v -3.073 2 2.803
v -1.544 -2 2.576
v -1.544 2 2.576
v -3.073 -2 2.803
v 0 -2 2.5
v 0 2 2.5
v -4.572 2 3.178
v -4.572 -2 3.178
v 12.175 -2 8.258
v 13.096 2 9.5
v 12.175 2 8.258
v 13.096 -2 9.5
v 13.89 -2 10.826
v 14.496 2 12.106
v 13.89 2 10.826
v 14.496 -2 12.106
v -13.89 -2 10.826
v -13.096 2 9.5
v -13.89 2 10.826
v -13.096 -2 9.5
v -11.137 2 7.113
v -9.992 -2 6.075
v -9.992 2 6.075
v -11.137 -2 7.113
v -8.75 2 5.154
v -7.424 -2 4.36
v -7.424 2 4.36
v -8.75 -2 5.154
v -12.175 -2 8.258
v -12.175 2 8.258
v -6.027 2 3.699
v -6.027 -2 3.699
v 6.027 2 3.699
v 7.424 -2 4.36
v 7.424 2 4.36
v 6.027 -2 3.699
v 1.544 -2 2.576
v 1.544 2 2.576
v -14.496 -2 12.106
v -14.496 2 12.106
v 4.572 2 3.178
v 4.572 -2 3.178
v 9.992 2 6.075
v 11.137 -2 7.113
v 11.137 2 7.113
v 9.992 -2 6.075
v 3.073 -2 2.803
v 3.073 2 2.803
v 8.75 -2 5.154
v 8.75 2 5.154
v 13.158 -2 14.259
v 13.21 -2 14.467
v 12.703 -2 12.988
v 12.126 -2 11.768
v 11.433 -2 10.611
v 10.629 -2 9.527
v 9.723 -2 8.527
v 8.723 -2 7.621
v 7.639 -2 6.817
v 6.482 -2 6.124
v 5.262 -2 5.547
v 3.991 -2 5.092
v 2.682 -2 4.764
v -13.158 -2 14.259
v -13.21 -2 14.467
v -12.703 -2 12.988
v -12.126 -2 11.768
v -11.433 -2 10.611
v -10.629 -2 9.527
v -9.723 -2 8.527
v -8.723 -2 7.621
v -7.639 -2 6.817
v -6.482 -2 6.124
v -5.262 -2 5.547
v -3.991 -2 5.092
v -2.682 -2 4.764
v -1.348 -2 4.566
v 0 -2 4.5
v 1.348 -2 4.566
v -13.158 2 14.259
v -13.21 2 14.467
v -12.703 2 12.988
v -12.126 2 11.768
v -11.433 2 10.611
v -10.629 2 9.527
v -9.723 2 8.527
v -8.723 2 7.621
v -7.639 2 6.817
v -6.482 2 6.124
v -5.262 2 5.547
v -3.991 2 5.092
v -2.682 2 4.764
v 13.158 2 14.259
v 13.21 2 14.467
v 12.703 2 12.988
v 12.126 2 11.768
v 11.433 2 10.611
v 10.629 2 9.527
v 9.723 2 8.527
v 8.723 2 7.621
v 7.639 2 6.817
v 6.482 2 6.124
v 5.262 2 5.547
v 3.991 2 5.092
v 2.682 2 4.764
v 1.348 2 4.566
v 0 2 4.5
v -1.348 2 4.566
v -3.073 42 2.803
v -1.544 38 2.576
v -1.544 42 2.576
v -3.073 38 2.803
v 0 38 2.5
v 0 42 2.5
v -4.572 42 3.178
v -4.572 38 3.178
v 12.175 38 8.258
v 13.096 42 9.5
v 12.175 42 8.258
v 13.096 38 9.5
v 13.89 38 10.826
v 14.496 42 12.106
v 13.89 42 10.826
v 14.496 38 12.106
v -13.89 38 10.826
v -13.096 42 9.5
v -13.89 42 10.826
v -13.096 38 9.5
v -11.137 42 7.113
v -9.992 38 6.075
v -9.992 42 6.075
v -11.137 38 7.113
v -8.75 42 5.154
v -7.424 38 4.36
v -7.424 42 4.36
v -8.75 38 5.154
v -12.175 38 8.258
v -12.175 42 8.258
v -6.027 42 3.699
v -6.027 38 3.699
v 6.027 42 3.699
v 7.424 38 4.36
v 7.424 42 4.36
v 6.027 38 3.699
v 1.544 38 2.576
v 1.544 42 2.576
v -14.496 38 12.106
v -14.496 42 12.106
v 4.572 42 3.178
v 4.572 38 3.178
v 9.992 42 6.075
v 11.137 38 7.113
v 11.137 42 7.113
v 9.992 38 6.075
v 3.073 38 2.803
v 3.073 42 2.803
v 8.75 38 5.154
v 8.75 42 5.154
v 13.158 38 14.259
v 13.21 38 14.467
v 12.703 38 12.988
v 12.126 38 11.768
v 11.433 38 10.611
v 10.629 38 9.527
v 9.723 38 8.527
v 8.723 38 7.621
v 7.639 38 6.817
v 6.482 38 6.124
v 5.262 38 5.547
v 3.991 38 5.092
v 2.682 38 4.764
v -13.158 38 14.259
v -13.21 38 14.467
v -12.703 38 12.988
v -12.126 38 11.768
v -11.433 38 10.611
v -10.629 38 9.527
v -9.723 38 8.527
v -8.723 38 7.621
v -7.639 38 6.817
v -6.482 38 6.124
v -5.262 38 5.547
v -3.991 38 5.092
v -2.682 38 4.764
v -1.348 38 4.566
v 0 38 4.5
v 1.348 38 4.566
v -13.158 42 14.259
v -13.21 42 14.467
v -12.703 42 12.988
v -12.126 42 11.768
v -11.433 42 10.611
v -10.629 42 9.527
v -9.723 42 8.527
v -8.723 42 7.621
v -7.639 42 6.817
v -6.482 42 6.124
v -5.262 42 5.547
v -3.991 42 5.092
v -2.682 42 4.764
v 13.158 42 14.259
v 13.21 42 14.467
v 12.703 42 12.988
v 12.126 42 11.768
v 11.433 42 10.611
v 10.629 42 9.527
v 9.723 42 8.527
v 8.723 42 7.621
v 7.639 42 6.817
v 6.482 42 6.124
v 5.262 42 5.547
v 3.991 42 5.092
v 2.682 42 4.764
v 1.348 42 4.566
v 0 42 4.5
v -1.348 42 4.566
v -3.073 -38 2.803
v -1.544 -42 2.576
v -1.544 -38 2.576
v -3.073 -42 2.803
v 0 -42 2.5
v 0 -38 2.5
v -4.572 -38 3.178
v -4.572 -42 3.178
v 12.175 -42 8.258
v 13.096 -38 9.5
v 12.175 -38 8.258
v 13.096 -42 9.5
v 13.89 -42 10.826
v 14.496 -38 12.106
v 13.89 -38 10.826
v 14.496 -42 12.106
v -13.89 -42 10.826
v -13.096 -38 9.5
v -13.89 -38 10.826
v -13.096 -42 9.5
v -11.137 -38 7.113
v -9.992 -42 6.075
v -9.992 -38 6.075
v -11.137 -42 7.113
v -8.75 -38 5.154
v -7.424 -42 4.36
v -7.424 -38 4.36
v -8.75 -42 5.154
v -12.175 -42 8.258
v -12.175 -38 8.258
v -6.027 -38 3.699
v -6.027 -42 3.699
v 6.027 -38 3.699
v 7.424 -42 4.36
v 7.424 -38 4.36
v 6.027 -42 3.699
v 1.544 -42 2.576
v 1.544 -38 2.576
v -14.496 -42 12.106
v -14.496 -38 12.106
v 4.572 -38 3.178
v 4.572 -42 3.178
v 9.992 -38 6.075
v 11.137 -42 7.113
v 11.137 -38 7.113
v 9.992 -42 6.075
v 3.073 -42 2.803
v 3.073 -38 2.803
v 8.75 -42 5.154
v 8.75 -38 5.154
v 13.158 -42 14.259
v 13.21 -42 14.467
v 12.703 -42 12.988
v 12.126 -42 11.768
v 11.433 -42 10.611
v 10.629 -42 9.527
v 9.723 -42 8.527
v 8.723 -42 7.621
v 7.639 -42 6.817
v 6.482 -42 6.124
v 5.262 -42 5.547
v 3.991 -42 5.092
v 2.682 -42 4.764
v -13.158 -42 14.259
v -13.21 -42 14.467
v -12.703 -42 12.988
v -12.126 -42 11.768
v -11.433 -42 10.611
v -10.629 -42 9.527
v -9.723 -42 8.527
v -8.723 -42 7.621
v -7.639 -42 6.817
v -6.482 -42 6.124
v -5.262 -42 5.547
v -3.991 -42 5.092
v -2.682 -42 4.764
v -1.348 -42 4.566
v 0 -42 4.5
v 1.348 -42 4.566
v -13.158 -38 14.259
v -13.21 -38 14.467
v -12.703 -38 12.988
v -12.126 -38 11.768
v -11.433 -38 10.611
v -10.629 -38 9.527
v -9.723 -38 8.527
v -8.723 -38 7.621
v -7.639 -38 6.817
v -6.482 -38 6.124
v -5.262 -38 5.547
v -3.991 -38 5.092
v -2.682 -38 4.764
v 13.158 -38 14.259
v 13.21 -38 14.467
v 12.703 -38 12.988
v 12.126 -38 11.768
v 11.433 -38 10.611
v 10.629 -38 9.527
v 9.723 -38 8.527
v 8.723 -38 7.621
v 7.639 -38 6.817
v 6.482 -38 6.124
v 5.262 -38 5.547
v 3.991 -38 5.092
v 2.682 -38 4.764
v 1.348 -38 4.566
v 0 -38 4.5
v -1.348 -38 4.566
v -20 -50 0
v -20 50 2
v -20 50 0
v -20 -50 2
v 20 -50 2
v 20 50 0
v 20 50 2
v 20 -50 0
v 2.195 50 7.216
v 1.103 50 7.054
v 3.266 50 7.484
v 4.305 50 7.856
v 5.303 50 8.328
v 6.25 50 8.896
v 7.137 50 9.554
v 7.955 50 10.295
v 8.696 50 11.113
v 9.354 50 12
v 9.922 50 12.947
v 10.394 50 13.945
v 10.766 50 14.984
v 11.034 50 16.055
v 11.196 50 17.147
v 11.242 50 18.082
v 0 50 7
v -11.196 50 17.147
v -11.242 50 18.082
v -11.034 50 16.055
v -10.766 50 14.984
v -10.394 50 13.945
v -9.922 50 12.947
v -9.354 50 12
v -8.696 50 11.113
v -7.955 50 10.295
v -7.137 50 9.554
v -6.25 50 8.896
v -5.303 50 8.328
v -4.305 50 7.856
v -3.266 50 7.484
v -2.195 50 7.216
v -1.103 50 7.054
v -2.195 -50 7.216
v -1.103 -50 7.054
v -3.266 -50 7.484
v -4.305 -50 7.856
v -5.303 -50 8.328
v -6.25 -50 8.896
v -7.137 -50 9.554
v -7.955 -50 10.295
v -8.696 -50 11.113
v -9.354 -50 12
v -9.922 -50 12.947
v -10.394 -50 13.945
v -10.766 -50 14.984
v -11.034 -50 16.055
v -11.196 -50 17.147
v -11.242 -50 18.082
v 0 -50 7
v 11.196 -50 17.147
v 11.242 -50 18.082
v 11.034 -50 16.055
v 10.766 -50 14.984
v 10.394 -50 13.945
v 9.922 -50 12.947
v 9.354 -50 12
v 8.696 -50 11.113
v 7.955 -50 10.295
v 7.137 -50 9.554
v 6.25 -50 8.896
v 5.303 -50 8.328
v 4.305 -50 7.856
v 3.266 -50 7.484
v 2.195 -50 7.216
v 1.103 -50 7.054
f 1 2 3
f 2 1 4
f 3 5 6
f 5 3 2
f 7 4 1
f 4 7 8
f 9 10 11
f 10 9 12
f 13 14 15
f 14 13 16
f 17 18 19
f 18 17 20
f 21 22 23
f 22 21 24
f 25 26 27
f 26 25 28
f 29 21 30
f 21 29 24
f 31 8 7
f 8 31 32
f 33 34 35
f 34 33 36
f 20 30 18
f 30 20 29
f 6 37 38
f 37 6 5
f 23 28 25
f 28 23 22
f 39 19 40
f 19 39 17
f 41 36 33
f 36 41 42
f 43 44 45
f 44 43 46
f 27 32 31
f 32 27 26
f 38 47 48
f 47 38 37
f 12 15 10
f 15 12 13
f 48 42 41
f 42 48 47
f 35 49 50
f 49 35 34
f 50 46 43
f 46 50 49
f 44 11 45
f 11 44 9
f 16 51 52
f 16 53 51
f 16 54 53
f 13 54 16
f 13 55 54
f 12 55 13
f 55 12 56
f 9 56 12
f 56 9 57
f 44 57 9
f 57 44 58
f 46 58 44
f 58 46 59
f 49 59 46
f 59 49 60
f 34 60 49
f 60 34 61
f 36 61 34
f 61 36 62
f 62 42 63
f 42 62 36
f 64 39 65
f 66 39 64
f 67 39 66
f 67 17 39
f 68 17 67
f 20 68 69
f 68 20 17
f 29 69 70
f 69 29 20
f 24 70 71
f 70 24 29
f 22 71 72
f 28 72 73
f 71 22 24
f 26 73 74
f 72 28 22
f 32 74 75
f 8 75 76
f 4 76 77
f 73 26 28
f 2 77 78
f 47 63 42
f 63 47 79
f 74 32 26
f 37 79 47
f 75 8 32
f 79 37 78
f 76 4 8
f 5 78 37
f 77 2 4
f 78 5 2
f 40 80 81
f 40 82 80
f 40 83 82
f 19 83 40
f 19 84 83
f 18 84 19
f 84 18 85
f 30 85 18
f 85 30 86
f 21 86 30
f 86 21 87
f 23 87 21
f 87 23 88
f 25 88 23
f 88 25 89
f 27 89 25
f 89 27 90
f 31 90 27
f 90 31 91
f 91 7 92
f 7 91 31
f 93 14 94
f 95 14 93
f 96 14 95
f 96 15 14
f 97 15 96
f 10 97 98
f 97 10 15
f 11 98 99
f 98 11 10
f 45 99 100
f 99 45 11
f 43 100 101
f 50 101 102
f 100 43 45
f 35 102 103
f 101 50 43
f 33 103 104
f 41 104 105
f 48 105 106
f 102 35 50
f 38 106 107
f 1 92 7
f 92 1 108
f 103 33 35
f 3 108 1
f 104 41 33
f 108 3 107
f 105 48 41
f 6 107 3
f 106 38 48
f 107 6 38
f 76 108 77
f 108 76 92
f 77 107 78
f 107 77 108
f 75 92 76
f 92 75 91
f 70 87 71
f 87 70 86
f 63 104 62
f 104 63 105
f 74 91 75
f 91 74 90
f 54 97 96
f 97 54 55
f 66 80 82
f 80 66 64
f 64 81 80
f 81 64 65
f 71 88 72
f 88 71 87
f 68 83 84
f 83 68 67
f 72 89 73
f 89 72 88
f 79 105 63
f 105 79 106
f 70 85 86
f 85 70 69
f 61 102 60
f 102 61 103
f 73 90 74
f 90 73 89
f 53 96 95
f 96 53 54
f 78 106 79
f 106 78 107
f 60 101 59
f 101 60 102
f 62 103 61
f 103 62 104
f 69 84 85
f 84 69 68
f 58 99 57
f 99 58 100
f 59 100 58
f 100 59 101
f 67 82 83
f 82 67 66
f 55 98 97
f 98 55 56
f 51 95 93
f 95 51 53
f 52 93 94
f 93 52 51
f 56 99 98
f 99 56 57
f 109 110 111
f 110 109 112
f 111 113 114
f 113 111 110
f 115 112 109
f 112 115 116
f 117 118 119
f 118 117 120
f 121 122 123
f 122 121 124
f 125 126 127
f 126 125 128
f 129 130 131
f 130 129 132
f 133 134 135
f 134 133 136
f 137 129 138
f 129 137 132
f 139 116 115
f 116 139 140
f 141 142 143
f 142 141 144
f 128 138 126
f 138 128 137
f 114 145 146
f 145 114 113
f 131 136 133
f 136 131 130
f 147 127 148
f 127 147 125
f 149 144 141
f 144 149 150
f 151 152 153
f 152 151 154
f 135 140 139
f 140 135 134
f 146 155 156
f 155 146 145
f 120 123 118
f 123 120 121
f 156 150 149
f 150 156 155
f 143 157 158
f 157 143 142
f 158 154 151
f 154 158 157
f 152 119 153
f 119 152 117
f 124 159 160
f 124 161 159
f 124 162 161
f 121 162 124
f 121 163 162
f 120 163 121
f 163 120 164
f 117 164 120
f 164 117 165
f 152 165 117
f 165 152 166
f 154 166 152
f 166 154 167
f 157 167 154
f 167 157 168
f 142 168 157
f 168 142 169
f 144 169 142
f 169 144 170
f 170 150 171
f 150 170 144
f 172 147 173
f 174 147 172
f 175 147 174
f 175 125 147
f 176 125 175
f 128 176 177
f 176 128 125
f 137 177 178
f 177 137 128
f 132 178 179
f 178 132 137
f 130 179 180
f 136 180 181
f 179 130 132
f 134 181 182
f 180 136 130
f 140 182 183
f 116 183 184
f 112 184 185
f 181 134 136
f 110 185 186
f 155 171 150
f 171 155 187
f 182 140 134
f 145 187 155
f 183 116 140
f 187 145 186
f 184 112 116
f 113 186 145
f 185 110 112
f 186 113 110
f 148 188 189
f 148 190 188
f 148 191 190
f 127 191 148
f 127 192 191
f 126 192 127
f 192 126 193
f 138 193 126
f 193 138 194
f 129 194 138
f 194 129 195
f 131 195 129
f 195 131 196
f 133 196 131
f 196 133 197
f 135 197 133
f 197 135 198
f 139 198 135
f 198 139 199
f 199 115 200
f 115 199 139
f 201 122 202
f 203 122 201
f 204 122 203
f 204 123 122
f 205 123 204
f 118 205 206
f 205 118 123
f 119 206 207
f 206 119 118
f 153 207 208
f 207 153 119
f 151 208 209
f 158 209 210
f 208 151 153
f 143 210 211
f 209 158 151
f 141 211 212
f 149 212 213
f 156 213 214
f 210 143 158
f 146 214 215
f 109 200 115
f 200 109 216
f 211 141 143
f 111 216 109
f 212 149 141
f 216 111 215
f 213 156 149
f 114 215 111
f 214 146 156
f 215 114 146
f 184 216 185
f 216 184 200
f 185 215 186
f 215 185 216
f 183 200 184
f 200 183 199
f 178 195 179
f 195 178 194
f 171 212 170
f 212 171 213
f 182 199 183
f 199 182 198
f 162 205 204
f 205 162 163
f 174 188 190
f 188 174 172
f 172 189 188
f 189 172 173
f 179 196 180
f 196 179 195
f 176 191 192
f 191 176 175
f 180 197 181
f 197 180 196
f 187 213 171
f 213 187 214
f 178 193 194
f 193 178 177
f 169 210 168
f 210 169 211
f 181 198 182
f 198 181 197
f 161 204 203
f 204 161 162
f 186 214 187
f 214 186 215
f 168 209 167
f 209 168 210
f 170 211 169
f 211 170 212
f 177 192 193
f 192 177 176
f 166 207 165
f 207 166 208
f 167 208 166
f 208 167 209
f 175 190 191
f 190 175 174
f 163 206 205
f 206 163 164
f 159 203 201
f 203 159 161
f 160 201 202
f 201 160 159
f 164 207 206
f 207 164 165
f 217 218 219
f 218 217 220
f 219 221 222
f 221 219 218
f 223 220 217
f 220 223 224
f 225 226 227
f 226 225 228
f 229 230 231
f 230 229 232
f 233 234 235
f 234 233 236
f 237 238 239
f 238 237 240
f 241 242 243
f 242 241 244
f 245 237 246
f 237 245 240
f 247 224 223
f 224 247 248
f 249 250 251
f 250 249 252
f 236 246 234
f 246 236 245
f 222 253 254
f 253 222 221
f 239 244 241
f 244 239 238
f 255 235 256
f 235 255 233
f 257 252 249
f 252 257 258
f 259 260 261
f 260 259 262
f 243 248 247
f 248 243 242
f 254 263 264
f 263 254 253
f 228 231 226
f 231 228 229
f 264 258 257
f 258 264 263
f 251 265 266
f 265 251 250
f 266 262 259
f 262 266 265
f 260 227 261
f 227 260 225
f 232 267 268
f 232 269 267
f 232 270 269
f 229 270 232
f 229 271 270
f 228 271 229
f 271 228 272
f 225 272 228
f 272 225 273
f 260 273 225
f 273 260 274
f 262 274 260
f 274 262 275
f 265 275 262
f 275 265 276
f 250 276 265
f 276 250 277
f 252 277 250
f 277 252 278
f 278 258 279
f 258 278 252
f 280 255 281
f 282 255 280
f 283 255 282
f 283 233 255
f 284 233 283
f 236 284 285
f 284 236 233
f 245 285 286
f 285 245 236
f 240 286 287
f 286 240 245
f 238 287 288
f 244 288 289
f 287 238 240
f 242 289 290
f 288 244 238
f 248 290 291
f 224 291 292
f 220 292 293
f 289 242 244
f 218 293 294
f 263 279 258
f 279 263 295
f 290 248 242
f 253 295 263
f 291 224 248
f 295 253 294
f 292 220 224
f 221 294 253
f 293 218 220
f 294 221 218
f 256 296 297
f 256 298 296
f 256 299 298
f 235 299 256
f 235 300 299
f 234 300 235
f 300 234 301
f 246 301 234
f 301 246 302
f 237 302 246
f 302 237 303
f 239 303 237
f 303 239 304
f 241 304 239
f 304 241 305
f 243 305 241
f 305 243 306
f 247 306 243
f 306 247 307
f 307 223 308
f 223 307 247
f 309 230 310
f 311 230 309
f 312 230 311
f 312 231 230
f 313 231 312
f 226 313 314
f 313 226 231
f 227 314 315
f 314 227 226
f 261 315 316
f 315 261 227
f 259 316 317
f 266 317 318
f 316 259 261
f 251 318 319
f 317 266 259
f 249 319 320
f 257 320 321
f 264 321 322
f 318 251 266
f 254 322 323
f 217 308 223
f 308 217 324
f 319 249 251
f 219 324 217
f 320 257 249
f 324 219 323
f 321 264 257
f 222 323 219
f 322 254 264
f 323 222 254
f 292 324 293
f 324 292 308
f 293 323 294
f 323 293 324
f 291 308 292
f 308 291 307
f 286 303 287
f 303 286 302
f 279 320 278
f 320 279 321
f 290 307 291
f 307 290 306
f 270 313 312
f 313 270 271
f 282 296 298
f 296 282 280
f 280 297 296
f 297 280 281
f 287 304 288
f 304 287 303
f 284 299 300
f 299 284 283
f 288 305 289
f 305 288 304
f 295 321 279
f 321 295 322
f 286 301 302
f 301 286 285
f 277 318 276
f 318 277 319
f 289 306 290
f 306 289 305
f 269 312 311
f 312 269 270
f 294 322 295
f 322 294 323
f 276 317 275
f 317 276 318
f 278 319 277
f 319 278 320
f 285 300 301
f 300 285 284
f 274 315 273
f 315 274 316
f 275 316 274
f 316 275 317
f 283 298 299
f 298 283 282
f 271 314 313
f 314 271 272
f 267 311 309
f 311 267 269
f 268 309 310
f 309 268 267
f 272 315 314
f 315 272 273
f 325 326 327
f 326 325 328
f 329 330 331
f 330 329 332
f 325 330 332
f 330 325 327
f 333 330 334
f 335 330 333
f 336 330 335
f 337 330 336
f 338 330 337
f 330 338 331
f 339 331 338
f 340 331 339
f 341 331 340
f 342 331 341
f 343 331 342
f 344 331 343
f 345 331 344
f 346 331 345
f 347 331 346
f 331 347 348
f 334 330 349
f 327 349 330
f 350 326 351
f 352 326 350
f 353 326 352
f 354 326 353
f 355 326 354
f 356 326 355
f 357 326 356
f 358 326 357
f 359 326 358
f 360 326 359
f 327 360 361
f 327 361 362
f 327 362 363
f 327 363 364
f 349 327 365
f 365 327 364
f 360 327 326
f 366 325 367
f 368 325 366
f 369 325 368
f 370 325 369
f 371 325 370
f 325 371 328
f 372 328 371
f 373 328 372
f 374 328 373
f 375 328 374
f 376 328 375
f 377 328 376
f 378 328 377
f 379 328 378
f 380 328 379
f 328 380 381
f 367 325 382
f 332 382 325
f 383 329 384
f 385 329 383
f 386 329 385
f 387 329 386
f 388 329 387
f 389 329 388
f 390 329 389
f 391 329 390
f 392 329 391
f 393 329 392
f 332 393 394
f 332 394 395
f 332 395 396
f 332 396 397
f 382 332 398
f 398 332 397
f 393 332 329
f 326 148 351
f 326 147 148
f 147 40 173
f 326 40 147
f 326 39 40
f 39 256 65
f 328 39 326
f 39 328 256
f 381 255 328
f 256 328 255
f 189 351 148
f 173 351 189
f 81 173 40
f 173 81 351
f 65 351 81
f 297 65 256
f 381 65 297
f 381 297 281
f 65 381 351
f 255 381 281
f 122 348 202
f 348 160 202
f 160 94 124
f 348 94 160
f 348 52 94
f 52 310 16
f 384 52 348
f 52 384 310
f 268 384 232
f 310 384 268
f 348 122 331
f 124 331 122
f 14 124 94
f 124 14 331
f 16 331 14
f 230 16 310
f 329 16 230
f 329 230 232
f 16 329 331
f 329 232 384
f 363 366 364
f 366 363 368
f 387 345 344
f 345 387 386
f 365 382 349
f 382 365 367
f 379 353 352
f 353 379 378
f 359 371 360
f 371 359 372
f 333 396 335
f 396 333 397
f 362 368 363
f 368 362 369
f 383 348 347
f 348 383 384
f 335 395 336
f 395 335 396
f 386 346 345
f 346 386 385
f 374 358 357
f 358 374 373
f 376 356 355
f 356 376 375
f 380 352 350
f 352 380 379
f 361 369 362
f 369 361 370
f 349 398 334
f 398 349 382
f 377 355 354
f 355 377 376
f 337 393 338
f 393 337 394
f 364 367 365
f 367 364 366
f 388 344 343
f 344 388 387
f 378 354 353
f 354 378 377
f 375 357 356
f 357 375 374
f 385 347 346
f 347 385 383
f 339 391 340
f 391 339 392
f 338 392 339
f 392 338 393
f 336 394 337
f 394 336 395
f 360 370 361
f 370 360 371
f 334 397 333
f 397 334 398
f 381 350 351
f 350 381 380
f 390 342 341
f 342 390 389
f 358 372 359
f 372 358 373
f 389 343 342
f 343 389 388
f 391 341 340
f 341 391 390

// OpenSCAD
// [FL_INDEX: keywords="openscad, 3d_parametric, Customizer_ed_flat_mount_for_round_pole, csg_solid" | COT="Parametric OpenSCAD design from 3DCodeverse"]
// Title: Customizer'ed flat mount for round pole

$fn=60+4;

//camera mount pole mounting legnth
camera_mount_lenght = 100 ;

//camera mount pole mount width
camera_mount_width = 40 ;

//camera leg pole diameter
pole_diameter = 22.5 ;

//ziptie width for atatchment add a bit for clearance
ziptie_width = 4 ;

//ziptie height for atatchment
ziptie_height = 2 ;

pole_diameter2 = pole_diameter/2;

centre_point = pole_diameter2+5+ziptie_height ;

rotate([0,0,90])difference(){
	hull(){
		translate([0,0,1])cube([camera_mount_lenght,camera_mount_width,2],true);
		difference(){
			translate([0,0,centre_point])rotate([0,90,0])cylinder(camera_mount_lenght,pole_diameter2-0.1,pole_diameter2-0.1,true);
			translate([0,0,centre_point+pole_diameter2])cube([camera_mount_lenght+2,pole_diameter+2,pole_diameter],true);
			}
		}
	translate([0,0,centre_point])rotate([0,90,0])cylinder(camera_mount_lenght+0.2,pole_diameter2,pole_diameter2,true);
//	translate([0,0,centre_point])cube([camera_mount_lenght+pole_diameter2,camera_mount_width+pole_diameter2,10],true);
	translate([camera_mount_lenght/2-10,0,0])zip();
	zip();
	translate([-camera_mount_lenght/2+10,0,0])zip();
	}

module zip(){
	translate([0,0,centre_point])rotate([0,90,0]){
		difference(){
			cylinder(ziptie_width,pole_diameter2+2.5+ziptie_height,pole_diameter2+2.5+ziptie_height,true);
			cylinder(ziptie_width+0.2,pole_diameter2+2.5,pole_diameter2+2.5,true);
			}
		}
	}
